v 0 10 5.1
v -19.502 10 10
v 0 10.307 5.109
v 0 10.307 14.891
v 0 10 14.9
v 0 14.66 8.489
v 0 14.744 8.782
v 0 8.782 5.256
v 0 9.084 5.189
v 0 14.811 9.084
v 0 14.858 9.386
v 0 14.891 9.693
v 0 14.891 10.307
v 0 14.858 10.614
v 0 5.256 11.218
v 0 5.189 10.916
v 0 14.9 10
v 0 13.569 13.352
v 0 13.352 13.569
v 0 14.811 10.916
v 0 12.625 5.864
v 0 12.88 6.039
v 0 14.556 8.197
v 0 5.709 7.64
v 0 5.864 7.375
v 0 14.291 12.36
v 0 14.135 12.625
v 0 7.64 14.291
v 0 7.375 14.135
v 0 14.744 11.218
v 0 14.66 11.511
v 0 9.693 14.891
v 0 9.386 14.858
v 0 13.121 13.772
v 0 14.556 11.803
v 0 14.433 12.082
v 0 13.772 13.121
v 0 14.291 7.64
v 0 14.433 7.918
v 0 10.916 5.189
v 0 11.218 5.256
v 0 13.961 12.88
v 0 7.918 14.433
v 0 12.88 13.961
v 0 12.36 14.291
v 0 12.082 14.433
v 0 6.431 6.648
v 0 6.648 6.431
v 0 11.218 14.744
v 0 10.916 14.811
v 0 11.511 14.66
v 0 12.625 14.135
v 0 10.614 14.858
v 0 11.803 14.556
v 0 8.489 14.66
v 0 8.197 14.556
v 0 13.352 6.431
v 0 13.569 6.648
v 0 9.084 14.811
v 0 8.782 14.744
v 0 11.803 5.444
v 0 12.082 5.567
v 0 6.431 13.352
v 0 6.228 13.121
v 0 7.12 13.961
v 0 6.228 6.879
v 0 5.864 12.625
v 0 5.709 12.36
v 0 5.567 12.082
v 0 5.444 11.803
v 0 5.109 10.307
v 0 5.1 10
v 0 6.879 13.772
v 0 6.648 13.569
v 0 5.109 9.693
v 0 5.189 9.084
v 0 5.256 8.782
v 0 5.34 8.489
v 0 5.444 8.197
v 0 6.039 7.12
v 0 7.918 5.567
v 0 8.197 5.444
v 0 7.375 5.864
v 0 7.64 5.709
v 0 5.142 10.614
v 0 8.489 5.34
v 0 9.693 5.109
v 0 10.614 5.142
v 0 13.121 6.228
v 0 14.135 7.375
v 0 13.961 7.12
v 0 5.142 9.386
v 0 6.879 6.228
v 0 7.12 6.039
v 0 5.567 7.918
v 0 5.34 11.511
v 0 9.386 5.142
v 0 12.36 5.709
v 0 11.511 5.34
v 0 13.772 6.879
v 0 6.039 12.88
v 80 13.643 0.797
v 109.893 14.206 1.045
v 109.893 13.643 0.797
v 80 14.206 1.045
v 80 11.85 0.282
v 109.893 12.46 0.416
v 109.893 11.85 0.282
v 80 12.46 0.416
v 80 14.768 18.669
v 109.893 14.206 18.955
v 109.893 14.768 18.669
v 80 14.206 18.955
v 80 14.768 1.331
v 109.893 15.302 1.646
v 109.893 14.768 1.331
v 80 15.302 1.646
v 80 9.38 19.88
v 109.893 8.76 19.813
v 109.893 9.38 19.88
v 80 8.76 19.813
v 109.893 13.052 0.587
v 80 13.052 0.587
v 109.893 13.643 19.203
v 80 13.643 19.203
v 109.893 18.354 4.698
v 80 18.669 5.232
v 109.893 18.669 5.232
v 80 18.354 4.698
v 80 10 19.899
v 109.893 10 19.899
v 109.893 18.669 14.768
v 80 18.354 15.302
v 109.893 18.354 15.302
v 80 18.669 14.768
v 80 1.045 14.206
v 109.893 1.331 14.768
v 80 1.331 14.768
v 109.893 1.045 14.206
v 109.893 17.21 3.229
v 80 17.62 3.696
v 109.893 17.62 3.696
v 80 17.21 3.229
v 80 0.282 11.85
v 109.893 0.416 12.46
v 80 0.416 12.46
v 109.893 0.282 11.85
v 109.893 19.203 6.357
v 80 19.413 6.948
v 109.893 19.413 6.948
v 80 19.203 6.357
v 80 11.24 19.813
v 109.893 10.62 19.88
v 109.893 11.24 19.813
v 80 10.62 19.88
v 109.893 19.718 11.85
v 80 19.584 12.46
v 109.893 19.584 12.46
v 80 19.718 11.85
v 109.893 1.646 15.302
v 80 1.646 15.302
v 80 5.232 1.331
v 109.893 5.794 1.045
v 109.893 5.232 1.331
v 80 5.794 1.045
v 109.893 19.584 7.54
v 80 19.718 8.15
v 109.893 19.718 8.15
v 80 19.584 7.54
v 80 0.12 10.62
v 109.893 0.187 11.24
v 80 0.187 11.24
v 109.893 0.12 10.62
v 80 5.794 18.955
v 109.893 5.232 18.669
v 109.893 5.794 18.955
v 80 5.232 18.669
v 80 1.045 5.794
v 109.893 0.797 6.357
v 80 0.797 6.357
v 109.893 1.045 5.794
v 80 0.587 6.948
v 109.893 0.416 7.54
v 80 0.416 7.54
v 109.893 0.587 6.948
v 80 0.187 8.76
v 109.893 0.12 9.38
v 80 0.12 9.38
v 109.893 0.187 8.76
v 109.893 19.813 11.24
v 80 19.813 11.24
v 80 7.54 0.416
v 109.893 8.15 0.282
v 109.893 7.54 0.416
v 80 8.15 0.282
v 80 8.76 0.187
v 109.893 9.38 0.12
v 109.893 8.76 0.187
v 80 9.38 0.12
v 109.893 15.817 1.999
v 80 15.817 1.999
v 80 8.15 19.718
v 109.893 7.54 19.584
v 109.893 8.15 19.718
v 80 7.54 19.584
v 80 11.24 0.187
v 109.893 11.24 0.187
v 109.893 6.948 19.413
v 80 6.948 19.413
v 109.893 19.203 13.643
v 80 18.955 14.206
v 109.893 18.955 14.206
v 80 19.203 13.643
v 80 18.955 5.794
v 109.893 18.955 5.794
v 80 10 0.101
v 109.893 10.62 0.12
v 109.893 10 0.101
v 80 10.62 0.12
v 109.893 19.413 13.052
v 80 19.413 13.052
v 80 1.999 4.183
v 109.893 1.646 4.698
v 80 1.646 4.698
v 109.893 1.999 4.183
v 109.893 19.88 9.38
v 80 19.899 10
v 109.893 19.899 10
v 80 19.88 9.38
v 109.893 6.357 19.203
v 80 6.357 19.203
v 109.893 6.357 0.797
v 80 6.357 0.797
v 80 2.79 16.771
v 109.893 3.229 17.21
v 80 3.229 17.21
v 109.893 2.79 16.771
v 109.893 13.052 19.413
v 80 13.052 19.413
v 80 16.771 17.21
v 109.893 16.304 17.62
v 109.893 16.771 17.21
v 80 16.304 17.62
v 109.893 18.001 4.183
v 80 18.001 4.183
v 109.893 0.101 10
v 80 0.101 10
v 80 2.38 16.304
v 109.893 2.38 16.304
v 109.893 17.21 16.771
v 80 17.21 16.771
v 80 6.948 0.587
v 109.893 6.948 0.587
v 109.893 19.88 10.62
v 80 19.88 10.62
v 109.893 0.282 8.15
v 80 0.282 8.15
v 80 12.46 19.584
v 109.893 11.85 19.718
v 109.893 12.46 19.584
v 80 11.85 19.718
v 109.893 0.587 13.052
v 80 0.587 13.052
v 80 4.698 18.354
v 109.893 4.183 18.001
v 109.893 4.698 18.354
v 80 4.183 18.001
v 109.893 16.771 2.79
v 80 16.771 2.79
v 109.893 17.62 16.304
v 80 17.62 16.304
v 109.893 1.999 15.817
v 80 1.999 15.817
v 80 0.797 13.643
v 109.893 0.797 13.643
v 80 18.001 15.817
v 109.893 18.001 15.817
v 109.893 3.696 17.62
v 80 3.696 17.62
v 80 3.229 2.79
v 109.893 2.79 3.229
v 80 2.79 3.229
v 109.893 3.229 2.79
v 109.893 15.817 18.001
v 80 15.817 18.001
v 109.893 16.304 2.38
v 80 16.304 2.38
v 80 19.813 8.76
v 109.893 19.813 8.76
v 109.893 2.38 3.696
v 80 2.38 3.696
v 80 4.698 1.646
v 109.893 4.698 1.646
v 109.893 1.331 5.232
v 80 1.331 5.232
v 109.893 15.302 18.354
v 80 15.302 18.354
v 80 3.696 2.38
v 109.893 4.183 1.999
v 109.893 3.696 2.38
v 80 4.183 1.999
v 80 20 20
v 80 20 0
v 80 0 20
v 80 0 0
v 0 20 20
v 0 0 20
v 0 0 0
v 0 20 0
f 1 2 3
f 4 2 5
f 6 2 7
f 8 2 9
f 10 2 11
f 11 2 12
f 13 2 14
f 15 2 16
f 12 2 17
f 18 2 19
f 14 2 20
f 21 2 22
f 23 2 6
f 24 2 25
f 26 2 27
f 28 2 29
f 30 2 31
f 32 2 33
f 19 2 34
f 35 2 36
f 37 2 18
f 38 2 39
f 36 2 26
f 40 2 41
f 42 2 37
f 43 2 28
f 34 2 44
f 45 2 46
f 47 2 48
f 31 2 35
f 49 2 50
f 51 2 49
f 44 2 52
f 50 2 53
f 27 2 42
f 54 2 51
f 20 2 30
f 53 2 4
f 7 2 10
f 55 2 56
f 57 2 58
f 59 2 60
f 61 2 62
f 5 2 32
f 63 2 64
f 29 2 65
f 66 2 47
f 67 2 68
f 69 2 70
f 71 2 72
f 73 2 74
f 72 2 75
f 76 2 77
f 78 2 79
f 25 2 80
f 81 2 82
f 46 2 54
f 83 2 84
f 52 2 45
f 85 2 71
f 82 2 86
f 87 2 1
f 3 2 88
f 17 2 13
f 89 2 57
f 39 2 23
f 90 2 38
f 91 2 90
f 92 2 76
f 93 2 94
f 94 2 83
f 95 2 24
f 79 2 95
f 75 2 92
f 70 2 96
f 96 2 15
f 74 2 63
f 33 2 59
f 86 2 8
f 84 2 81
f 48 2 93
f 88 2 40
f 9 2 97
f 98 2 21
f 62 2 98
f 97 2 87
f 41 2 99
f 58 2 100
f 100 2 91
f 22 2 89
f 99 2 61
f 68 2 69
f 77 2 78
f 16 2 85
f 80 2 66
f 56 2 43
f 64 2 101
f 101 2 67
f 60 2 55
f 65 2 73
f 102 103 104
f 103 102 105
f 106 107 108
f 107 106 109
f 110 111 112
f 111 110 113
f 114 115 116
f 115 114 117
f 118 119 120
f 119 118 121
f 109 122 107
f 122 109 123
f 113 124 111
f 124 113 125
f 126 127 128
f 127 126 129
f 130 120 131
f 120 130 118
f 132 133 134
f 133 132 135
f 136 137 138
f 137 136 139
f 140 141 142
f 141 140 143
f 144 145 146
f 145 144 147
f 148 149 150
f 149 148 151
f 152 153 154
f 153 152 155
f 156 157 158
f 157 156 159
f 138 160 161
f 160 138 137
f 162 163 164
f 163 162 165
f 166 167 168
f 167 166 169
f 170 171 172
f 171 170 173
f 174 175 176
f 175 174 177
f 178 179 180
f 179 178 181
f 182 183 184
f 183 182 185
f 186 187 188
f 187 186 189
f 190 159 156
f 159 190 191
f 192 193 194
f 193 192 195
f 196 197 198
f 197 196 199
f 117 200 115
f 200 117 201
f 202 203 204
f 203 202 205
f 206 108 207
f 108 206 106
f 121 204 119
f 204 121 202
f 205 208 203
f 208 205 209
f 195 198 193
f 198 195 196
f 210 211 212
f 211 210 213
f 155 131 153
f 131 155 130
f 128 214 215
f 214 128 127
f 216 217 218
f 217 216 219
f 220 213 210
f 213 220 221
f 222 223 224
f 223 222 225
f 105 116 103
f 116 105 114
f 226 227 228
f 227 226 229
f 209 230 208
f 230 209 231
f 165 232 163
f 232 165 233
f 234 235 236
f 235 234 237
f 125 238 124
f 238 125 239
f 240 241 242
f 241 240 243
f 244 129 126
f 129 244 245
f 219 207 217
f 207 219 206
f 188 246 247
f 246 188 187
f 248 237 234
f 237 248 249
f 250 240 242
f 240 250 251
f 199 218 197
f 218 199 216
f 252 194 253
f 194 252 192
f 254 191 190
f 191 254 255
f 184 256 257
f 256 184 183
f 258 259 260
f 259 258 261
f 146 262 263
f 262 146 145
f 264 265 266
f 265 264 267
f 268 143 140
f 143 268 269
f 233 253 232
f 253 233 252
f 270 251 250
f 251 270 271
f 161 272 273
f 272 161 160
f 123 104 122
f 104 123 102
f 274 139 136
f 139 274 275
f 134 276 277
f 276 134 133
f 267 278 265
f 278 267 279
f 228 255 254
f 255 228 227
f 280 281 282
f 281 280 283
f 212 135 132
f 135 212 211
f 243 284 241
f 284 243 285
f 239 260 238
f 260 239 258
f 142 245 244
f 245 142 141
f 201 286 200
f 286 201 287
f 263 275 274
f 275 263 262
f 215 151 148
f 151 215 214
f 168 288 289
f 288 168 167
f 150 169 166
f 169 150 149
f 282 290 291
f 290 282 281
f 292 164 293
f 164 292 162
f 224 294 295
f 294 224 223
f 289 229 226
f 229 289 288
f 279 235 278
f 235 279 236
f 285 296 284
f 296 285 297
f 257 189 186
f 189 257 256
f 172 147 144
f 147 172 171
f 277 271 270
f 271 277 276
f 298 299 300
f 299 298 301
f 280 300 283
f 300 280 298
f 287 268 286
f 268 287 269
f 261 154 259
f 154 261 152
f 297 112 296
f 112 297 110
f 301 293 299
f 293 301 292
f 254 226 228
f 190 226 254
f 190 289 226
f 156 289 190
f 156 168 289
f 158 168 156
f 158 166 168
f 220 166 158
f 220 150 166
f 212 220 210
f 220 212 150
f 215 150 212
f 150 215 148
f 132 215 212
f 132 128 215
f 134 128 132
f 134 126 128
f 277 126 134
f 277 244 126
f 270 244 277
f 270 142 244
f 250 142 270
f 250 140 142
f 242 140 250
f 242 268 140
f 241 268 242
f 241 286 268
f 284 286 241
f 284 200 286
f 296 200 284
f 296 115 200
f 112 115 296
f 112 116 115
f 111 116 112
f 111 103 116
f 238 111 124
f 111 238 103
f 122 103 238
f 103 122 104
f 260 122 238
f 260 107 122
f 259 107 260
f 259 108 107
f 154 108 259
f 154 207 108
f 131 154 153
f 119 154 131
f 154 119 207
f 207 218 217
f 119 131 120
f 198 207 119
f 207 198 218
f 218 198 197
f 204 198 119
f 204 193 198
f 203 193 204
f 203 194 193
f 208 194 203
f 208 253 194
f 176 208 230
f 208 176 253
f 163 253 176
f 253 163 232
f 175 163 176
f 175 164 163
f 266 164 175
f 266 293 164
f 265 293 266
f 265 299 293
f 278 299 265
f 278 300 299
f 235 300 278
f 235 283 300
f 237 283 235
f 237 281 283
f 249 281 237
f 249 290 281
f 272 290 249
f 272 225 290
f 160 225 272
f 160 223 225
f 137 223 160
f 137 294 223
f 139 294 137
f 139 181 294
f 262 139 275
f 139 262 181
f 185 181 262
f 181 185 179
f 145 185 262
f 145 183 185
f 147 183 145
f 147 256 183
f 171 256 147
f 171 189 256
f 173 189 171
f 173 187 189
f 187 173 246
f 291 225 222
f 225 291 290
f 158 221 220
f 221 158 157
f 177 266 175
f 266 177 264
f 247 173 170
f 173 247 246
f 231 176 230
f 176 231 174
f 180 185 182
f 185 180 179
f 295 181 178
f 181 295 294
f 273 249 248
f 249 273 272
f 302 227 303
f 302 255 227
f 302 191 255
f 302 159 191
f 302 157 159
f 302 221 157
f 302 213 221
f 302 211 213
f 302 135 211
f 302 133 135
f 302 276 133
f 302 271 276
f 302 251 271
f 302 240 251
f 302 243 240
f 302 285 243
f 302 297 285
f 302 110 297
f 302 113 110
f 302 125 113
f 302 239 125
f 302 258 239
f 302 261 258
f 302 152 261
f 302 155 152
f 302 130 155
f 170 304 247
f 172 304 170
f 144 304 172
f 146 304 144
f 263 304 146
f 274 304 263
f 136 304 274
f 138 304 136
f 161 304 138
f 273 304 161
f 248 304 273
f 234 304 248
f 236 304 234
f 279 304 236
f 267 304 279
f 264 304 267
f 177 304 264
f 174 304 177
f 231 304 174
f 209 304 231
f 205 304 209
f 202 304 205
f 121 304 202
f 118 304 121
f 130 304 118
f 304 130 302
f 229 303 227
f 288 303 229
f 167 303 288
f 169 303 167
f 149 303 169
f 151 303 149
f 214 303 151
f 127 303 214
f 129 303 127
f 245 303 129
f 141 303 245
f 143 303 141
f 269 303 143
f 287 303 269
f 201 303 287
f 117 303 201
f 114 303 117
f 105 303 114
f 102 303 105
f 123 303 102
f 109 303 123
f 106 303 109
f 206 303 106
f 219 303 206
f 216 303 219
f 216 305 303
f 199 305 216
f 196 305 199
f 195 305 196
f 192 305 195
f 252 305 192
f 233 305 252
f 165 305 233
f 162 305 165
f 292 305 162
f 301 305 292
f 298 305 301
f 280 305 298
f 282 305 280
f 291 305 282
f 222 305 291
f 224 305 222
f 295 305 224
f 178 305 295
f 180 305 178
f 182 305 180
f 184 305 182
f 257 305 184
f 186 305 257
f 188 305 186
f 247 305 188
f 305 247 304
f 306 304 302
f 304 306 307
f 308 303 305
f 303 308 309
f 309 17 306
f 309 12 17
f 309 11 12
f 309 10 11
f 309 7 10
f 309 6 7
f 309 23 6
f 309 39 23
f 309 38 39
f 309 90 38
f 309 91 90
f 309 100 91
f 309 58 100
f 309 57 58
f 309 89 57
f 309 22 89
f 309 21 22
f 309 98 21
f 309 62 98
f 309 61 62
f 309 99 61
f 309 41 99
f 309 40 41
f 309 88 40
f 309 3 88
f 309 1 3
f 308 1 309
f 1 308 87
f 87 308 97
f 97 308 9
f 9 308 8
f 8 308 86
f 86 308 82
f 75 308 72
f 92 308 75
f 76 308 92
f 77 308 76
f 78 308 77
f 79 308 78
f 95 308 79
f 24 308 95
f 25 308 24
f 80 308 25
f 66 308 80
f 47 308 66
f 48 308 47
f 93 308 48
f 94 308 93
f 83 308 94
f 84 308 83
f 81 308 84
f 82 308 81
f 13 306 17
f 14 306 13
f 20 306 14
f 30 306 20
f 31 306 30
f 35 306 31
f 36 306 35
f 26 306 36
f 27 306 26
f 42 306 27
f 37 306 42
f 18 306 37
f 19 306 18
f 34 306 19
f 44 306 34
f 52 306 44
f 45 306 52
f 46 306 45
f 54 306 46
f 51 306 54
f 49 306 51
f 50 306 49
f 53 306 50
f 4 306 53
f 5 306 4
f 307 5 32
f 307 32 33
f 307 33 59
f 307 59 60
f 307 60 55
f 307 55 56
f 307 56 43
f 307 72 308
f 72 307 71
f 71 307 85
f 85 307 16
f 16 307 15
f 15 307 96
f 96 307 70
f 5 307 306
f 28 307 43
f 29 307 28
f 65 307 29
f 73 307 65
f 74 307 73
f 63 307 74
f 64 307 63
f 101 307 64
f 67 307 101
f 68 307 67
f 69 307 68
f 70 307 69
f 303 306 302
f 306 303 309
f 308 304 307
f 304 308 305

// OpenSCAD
$fn=100;

module hopper(ht, funnel_h, funnel_r, orifice_r, hopper_center_yz) {
    funnel_extension = orifice_r*funnel_h/(funnel_r - orifice_r);
    overlap = 1e-6*funnel_h;

    translate([-funnel_extension, hopper_center_yz, hopper_center_yz]) {
       rotate([0,90,0]) {
          union(){
             cylinder(h = funnel_h + funnel_extension, r1 = 0, r2 = funnel_r, center = false);
             translate([0,0,funnel_h + funnel_extension - overlap]){
                cylinder(h = ht, r = funnel_r, center = false);
             }
          }
       }
    }
}

module exa_hopper(vis_mode=true) {
    domain = [0.008, 0.002, 0.002];
    ht = 0.009;
    funnel_h = 0.00199;
    funnel_r=0.00099;
    orifice_r=0.00049;
    hopper_center_yz=0.0010;
    
    scl = vis_mode ? 1e4 : 1.0; //scale for visualization
    
    scale(scl) {
       hopper(ht = ht, 
       funnel_h = funnel_h, 
       funnel_r = funnel_r, 
       orifice_r = orifice_r, 
       hopper_center_yz = hopper_center_yz);
    }
    
    if(vis_mode) {
        color("gray", 0.5) cube(size = scl * domain);
    }
}

exa_hopper(vis_mode=true);
